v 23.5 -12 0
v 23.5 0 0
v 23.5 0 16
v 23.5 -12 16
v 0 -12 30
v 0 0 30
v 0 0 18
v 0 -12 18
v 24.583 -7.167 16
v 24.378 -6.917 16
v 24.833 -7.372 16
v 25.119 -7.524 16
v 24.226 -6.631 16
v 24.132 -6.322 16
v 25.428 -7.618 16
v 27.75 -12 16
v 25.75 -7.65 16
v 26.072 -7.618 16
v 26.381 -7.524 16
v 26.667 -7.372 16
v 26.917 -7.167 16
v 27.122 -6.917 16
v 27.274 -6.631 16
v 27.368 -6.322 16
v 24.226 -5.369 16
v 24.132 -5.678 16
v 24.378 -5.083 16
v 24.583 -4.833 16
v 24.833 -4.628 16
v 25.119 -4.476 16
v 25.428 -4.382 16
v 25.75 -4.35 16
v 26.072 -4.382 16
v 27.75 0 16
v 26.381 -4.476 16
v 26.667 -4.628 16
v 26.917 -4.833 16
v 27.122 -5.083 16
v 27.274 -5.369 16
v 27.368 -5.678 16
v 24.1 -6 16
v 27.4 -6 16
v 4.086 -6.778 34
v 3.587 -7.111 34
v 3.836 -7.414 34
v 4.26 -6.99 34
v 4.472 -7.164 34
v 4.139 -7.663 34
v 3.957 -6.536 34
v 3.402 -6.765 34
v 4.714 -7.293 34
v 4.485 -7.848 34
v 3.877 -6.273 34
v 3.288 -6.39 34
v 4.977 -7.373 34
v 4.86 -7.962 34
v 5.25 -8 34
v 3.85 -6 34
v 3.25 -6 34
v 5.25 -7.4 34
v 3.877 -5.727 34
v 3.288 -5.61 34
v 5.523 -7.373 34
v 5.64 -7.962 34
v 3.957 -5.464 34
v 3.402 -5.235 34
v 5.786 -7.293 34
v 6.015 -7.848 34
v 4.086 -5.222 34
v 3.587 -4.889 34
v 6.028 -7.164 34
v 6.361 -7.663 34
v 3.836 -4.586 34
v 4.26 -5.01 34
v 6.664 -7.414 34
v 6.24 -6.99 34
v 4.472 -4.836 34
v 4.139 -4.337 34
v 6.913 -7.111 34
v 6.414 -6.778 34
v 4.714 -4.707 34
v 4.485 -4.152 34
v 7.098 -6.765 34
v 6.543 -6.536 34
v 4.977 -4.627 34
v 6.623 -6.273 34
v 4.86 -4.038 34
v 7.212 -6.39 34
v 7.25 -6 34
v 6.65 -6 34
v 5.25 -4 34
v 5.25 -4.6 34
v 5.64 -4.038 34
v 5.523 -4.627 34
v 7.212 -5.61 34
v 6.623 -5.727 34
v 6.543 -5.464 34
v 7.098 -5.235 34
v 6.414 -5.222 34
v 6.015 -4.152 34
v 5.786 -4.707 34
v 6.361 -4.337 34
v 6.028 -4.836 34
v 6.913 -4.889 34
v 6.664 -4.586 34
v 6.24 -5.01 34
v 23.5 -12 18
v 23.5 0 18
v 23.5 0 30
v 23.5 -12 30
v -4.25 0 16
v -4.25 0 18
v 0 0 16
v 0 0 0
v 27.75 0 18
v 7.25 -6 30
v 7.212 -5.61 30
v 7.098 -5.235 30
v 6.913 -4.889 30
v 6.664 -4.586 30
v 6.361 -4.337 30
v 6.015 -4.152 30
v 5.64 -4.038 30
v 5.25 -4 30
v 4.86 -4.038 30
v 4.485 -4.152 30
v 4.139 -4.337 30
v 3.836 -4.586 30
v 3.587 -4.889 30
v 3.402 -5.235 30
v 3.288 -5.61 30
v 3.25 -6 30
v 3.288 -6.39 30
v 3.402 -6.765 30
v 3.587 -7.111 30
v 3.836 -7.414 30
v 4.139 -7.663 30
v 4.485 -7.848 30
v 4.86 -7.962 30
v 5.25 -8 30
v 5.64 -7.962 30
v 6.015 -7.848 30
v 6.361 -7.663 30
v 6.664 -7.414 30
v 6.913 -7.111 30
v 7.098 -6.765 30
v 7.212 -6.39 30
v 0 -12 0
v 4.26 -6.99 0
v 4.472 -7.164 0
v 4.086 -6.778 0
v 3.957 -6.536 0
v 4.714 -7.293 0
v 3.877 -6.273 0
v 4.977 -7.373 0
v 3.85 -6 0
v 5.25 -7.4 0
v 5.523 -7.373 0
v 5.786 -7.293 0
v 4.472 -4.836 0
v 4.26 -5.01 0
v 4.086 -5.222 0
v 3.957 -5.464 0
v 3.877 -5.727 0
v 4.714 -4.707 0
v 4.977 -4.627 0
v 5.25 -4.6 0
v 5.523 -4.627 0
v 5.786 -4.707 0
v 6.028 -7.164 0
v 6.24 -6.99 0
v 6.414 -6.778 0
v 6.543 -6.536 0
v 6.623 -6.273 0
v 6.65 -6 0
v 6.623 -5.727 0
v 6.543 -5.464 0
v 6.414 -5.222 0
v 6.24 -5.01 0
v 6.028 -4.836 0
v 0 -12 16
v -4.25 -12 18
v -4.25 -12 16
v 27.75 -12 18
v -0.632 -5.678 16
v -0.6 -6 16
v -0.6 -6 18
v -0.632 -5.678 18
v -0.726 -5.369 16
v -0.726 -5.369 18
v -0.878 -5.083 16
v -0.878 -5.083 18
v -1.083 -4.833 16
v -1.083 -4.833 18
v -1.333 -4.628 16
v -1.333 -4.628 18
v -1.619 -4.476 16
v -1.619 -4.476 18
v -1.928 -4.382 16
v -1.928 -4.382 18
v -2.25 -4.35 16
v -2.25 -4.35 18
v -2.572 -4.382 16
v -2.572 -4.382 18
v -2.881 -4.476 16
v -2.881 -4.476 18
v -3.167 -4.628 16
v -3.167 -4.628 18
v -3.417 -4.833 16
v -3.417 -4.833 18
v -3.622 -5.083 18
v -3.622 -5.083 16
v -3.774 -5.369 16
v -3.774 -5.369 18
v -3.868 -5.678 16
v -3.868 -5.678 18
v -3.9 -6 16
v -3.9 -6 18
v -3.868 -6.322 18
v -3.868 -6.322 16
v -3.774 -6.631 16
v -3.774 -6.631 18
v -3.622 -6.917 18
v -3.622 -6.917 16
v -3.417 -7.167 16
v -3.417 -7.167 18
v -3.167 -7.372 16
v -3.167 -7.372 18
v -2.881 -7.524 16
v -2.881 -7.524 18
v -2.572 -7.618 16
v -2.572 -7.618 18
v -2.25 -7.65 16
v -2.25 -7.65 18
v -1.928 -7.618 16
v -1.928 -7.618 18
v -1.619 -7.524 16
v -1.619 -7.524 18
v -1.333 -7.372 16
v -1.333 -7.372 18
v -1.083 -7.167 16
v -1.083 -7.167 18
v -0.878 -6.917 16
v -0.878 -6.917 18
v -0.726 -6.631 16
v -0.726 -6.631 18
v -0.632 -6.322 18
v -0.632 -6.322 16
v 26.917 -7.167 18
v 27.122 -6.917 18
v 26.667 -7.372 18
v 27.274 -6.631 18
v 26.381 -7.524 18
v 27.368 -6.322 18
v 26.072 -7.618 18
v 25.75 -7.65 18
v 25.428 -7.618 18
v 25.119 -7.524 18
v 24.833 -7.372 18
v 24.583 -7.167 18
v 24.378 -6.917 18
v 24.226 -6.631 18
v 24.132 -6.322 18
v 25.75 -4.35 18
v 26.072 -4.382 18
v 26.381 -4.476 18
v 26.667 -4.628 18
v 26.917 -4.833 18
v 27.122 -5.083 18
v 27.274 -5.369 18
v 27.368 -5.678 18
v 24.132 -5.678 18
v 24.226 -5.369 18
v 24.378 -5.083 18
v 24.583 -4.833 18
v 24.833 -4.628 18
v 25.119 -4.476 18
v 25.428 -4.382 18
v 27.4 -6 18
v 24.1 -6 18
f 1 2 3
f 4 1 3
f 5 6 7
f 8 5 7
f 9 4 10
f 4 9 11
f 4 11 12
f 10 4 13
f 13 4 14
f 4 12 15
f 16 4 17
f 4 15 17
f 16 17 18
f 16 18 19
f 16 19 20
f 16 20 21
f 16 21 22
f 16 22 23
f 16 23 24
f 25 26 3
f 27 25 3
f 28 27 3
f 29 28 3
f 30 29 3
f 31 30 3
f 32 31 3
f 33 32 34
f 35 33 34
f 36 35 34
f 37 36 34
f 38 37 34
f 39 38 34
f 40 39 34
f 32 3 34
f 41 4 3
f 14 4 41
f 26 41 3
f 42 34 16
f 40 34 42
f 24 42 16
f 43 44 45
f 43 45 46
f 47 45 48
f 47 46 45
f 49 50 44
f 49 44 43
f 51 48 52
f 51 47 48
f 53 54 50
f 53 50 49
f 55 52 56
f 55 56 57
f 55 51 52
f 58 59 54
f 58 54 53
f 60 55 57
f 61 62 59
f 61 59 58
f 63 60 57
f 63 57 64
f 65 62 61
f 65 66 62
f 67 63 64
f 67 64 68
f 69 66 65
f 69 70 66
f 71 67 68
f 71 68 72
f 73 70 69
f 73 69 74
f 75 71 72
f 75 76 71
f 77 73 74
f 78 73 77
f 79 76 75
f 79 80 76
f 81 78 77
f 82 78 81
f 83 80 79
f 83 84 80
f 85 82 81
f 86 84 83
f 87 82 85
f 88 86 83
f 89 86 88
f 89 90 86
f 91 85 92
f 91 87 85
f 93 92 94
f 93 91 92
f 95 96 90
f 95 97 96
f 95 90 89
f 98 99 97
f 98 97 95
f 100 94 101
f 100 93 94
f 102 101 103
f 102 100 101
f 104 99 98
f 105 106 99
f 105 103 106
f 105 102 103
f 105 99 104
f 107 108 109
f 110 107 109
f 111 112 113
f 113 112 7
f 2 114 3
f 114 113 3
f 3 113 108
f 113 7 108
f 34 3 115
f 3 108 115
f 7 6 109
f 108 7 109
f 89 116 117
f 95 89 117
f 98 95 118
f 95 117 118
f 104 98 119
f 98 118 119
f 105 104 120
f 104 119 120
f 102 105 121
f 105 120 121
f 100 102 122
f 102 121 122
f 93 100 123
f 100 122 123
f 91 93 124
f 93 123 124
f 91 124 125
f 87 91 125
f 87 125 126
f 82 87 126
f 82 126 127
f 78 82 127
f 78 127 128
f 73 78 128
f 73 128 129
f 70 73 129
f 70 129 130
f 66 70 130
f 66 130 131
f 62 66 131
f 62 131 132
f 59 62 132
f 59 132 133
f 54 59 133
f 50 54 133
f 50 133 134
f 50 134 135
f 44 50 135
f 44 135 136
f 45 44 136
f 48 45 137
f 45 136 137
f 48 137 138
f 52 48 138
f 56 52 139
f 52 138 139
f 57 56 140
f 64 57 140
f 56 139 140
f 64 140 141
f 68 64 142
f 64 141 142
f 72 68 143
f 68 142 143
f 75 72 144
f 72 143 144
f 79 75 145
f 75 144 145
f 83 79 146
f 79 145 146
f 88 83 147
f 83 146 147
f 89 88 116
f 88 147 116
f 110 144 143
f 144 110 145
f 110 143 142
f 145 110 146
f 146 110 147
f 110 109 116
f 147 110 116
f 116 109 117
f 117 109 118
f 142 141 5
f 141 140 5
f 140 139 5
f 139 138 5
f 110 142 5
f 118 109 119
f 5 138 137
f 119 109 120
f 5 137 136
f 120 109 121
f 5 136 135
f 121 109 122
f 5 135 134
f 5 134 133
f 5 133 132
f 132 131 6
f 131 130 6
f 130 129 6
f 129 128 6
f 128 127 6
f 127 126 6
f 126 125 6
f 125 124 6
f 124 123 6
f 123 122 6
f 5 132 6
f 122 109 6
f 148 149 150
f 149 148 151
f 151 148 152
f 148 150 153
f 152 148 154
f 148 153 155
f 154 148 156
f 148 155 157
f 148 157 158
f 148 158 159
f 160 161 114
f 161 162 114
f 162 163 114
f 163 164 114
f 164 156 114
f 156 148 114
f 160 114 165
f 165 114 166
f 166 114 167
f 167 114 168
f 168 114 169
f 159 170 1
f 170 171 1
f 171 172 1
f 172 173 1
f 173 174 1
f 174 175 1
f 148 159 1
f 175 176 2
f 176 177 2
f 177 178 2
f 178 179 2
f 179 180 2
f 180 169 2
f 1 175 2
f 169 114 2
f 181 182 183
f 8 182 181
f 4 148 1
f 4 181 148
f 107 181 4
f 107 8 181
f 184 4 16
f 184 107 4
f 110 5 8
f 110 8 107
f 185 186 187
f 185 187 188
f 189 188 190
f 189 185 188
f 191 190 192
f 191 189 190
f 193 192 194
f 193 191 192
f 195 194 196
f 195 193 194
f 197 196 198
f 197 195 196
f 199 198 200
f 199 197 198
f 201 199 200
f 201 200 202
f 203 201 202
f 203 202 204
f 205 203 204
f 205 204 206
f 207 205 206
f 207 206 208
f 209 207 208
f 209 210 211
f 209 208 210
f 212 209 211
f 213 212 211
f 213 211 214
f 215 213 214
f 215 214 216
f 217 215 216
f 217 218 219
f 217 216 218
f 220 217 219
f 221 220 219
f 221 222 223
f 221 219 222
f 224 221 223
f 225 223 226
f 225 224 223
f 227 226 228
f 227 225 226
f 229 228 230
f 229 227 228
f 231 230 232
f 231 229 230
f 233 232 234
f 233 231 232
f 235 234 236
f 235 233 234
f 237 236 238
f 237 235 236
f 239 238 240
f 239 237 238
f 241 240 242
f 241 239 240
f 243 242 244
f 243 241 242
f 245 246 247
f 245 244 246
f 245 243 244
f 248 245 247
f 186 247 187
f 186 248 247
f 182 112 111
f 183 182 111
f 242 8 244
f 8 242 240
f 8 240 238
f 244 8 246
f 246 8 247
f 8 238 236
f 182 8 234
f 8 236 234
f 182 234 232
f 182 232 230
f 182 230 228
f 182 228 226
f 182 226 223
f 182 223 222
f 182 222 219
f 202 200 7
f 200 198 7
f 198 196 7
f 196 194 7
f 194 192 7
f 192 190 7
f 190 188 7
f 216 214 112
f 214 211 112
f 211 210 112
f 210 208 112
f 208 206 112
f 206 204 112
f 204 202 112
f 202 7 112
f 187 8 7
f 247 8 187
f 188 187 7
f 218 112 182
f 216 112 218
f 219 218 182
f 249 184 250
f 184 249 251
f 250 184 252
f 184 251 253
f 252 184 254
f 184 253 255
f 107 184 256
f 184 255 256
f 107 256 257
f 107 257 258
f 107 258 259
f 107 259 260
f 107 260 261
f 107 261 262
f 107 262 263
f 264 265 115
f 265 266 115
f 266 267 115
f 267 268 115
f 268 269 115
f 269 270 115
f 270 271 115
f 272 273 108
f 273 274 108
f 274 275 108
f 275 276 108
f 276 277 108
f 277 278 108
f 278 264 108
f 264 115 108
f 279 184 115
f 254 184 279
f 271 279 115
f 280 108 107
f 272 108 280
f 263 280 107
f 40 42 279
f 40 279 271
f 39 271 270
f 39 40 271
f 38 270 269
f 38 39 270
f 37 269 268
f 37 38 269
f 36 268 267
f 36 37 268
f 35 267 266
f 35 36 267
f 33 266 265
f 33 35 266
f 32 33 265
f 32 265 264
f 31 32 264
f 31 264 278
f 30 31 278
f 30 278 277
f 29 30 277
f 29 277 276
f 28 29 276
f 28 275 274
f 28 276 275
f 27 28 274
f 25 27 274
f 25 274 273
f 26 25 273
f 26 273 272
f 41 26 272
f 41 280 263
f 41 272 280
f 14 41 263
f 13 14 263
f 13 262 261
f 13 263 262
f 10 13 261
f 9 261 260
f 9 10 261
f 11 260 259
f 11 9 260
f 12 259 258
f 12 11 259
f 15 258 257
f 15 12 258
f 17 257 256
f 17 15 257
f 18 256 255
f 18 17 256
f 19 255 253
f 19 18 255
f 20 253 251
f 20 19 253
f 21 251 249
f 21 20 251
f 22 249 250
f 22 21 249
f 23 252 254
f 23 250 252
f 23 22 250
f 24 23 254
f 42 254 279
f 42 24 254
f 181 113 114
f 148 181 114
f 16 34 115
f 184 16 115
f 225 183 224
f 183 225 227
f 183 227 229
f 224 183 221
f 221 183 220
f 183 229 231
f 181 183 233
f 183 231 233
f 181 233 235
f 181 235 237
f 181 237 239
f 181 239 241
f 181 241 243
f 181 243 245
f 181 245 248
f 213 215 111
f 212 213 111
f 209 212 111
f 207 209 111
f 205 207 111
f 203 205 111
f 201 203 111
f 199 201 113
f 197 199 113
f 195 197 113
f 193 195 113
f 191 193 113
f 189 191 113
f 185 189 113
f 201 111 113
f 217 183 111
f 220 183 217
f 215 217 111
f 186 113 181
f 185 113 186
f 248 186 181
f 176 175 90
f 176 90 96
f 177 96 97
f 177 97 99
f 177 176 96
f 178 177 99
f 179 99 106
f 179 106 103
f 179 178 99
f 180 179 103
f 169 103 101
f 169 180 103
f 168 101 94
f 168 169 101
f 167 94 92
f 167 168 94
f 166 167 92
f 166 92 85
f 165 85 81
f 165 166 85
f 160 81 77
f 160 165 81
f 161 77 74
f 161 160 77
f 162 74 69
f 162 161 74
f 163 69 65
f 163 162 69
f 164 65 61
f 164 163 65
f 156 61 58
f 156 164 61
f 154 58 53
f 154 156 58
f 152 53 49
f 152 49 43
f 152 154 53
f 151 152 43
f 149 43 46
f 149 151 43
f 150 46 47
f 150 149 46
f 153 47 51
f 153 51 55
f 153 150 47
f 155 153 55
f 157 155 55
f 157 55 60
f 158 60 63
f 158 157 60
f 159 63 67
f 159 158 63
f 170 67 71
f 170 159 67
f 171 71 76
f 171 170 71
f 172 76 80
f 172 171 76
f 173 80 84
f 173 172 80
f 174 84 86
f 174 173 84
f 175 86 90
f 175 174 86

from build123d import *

# Parameters (mm, degrees)
PAD019_DEPTH      = 12
SKETCH028_R       = 1.65
POCKET008_DEPTH   = 50
CYLINDER_R        = 2
CYLINDER_DEPTH    = 34
CYLINDER001_R     = 1.4
CYLINDER001_DEPTH = 34


with BuildPart() as part:
    # Sketch027 → Pad019 (new body)
    with BuildSketch(Plane.XZ):
        Polygon((0, 0), (23.5, 0), (23.5, 16), (27.75, 16), (27.75, 18), (23.5, 18), (23.5, 30), (0, 30), (0, 18), (-4.25, 18), (-4.25, 16), (0, 16), align=None)
    extrude(amount=PAD019_DEPTH)

    # Sketch028 → Pocket008 (cut)
    with BuildSketch(Plane.XY):
        with Locations((-2.25, -6)):
            Circle(SKETCH028_R)
        with Locations((25.75, -6)):
            Circle(SKETCH028_R)
    extrude(amount=POCKET008_DEPTH, mode=Mode.SUBTRACT)

    # Cylinder → Cylinder (join)
    with BuildSketch(Plane(origin=(5.25, -6, 0), x_dir=(1, 0, 0), z_dir=(0, 0, 1))):
        Circle(CYLINDER_R)
    extrude(amount=CYLINDER_DEPTH)

    # Cylinder001 → Cylinder001 (cut)
    with BuildSketch(Plane(origin=(5.25, -6, 0), x_dir=(1, 0, 0), z_dir=(0, 0, 1))):
        Circle(CYLINDER001_R)
    extrude(amount=CYLINDER001_DEPTH, mode=Mode.SUBTRACT)


solid = part.part
